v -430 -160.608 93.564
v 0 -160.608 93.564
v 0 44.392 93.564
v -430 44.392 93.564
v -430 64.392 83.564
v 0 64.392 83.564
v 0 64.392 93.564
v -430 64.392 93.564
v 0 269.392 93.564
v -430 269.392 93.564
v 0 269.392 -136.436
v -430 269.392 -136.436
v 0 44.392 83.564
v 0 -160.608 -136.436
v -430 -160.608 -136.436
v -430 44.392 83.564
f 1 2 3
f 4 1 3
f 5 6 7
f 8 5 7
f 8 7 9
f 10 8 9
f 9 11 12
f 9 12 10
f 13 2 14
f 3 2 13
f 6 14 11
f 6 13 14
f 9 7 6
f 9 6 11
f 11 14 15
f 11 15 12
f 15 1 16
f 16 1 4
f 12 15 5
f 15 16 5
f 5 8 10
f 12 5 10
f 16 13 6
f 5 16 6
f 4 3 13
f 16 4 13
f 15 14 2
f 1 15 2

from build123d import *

# Parameters (mm, degrees)
F0_W     = 430
F0_H     = 230
F1_DEPTH = 430
F3_DEPTH = 560


with BuildPart() as f1:
    # F0 (on Right) → F1 (new body)
    with BuildSketch(Plane.YZ):
        with Locations((54.391704, -21.43599)):
            Rectangle(F0_W, F0_H)
    extrude(amount=-F1_DEPTH)

    # F2 (on face) → F3 (cut)
    with BuildSketch(Plane.YZ):
        Polygon((54.391704, 93.56401), (44.391704, 93.56401), (44.391704, 83.56401), (64.391704, 83.56401), (64.391704, 93.56401), align=None)
    extrude(amount=-F3_DEPTH, mode=Mode.SUBTRACT)


solid = f1.part
